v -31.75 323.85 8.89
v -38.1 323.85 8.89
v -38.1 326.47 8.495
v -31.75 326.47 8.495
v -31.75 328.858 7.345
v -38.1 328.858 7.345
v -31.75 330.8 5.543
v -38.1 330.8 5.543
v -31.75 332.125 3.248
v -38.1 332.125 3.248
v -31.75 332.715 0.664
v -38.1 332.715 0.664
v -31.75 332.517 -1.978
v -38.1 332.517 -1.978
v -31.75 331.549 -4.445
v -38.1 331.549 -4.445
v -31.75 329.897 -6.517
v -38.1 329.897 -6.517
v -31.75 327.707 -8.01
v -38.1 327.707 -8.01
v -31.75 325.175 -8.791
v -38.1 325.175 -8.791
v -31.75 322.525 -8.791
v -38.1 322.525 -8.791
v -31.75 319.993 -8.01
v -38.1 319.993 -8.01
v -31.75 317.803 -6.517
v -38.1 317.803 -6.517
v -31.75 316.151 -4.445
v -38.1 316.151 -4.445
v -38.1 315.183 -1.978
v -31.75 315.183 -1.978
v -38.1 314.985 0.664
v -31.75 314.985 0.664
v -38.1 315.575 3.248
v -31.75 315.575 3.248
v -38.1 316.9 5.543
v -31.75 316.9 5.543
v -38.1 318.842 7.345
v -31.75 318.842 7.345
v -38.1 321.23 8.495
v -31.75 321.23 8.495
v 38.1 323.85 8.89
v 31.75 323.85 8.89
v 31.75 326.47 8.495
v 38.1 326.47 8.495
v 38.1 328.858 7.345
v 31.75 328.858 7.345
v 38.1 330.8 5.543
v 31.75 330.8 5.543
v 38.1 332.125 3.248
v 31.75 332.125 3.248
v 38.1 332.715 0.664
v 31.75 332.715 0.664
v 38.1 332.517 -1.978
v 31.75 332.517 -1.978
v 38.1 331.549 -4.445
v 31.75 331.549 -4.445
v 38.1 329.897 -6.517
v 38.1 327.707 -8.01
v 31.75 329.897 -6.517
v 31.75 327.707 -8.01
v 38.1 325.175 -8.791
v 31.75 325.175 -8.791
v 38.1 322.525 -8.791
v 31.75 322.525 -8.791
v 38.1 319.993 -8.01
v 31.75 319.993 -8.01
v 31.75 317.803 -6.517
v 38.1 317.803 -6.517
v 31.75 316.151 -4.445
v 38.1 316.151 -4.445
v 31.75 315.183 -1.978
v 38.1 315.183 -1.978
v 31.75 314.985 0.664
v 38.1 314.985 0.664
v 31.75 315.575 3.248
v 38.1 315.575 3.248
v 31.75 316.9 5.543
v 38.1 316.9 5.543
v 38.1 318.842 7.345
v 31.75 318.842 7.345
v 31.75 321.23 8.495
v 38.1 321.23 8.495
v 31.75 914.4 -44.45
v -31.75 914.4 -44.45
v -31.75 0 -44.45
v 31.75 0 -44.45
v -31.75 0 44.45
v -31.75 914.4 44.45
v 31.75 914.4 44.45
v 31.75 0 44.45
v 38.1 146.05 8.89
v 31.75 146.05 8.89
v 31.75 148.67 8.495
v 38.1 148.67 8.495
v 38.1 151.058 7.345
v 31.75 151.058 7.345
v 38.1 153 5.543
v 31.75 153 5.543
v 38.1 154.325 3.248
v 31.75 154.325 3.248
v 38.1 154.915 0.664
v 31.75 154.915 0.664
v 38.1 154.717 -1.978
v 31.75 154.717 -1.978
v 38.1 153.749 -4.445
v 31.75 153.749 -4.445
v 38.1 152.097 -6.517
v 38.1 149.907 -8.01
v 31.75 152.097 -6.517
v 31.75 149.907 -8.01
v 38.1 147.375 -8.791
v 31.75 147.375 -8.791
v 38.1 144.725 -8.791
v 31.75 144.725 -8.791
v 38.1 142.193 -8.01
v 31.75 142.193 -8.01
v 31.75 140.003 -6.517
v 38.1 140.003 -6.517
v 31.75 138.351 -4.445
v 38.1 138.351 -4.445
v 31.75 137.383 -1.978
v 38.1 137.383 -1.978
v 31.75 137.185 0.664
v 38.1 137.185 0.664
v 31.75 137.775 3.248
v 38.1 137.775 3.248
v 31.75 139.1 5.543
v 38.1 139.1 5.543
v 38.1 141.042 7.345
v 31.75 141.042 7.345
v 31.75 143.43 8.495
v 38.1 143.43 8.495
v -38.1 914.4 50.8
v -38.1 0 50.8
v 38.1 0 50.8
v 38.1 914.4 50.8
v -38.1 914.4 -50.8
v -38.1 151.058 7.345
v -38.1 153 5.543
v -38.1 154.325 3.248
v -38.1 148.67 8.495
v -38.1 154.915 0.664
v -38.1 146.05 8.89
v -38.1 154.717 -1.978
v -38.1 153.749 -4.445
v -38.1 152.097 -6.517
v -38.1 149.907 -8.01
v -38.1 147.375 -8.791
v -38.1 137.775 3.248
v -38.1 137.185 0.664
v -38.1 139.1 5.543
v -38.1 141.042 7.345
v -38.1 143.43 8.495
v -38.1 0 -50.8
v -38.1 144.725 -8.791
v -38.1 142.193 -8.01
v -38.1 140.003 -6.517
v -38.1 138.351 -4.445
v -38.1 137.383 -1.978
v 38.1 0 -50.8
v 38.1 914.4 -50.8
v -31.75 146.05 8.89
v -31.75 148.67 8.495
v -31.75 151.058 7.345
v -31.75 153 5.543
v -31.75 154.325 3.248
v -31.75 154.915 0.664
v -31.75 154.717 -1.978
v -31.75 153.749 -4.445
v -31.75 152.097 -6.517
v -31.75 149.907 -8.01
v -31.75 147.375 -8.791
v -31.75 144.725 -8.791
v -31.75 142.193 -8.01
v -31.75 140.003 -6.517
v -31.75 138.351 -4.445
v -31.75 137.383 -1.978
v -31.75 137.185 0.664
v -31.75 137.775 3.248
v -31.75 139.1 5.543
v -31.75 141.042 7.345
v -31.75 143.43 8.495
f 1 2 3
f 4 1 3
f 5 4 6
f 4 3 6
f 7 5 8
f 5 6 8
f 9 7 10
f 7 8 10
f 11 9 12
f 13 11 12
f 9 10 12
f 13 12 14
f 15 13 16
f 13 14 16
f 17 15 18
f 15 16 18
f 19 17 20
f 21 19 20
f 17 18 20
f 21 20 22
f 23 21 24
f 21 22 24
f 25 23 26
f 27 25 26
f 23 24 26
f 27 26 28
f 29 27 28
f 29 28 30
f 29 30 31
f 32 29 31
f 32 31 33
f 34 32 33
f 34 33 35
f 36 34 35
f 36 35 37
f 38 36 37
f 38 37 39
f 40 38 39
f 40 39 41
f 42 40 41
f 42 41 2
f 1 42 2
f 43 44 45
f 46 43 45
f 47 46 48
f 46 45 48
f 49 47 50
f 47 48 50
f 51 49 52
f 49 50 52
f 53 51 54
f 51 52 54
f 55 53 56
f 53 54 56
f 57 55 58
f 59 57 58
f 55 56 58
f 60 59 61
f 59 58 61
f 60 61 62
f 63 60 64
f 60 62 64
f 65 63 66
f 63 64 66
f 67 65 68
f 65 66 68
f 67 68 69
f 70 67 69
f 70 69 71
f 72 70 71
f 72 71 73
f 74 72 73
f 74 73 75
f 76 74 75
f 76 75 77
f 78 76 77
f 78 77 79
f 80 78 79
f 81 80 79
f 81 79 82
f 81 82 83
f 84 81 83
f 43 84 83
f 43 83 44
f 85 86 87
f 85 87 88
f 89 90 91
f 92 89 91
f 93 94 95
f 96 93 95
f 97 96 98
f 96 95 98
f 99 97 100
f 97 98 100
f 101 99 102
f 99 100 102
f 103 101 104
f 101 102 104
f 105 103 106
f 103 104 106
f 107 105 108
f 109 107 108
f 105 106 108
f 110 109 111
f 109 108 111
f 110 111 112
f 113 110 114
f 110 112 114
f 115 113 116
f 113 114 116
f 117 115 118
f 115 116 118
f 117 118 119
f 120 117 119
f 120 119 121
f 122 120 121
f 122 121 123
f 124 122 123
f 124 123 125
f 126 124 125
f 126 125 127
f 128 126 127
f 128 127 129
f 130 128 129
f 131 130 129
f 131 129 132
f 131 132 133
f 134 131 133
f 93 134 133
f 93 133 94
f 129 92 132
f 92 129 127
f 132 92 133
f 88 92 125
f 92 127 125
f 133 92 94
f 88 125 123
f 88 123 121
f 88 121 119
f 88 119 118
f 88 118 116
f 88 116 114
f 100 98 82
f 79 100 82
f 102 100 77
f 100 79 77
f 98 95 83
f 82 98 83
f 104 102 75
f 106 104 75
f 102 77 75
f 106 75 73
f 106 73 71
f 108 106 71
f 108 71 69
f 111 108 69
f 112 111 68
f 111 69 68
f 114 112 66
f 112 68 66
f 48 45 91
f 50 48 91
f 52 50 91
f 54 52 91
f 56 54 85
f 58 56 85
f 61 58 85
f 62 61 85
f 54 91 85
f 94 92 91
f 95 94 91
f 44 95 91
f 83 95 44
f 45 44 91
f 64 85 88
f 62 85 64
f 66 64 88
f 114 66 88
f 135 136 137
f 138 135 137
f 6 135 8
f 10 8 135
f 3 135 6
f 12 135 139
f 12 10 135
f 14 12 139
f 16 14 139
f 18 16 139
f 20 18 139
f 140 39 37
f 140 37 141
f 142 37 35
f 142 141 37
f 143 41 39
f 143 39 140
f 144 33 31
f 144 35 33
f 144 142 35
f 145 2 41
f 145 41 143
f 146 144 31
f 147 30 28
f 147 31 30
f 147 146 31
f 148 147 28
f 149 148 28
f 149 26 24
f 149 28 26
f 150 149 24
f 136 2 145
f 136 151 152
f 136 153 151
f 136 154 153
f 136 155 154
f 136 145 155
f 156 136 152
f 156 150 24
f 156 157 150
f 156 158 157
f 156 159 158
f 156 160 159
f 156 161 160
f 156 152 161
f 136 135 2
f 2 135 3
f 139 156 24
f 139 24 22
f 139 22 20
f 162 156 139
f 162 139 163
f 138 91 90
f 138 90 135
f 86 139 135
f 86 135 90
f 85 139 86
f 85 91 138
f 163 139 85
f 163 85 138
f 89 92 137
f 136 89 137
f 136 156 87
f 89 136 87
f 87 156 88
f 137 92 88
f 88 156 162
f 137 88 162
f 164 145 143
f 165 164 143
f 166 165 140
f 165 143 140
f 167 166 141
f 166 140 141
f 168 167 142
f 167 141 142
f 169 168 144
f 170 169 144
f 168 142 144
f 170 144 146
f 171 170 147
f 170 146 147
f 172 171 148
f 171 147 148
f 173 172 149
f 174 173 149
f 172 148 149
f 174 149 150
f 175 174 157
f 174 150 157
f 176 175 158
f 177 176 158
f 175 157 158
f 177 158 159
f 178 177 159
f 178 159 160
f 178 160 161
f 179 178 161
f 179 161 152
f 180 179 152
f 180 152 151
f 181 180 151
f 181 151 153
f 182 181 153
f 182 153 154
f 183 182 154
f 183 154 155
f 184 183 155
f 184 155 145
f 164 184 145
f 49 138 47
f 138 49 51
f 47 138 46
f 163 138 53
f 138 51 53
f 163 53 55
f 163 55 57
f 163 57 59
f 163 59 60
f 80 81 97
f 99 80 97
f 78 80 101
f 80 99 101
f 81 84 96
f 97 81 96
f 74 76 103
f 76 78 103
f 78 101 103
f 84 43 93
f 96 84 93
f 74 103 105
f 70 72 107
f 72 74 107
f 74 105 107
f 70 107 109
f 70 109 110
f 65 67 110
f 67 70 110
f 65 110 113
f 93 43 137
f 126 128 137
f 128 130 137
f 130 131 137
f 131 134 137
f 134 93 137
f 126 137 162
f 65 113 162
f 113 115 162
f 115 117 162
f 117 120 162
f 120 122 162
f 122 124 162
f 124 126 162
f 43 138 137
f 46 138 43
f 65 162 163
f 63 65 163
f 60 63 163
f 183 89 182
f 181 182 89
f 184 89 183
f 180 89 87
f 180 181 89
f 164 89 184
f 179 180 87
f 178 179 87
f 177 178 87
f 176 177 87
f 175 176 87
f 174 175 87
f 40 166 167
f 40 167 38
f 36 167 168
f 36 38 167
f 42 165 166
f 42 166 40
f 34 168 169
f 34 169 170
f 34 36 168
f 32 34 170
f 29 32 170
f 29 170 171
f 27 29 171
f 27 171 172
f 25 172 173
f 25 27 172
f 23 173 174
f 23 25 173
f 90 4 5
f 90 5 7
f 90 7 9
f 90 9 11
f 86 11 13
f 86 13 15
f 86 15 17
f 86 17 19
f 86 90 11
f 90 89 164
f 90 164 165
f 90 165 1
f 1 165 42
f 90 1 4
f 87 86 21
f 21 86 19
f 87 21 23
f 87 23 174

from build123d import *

# Parameters (mm, degrees)
SKETCH1_W           = 76.2
SKETCH1_H           = 101.6
BOSS_EXTRUDE1_DEPTH = 914.4
SKETCH2_W           = 63.5
SKETCH2_H           = 88.9
CUT_EXTRUDE1_DEPTH  = 917.602209249
SKETCH3_R           = 8.89
CUT_EXTRUDE2_DEPTH  = 919.974667768


with BuildPart() as part:
    # Sketch1 → Boss-Extrude1 (new body)
    with BuildSketch(Plane(origin=(0, 0, 0), x_dir=(1, 0, 0), z_dir=(0, 1, 0))):
        Rectangle(SKETCH1_W, SKETCH1_H)
    extrude(amount=BOSS_EXTRUDE1_DEPTH)

    # Sketch2 → Cut-Extrude1 (cut, through all)
    with BuildSketch(Plane(origin=(0, 914.4, 0), x_dir=(1, 0, 0), z_dir=(0, 1, 0))):
        Rectangle(SKETCH2_W, SKETCH2_H)
    extrude(amount=-CUT_EXTRUDE1_DEPTH, mode=Mode.SUBTRACT)

    # Sketch3 → Cut-Extrude2 (cut, through all)
    with BuildSketch(Plane.ZY.offset(38.1)):
        with Locations((0, 146.05)):
            Circle(SKETCH3_R)
        with Locations((0, 323.85)):
            Circle(SKETCH3_R)
    extrude(amount=-CUT_EXTRUDE2_DEPTH, mode=Mode.SUBTRACT)


solid = part.part
